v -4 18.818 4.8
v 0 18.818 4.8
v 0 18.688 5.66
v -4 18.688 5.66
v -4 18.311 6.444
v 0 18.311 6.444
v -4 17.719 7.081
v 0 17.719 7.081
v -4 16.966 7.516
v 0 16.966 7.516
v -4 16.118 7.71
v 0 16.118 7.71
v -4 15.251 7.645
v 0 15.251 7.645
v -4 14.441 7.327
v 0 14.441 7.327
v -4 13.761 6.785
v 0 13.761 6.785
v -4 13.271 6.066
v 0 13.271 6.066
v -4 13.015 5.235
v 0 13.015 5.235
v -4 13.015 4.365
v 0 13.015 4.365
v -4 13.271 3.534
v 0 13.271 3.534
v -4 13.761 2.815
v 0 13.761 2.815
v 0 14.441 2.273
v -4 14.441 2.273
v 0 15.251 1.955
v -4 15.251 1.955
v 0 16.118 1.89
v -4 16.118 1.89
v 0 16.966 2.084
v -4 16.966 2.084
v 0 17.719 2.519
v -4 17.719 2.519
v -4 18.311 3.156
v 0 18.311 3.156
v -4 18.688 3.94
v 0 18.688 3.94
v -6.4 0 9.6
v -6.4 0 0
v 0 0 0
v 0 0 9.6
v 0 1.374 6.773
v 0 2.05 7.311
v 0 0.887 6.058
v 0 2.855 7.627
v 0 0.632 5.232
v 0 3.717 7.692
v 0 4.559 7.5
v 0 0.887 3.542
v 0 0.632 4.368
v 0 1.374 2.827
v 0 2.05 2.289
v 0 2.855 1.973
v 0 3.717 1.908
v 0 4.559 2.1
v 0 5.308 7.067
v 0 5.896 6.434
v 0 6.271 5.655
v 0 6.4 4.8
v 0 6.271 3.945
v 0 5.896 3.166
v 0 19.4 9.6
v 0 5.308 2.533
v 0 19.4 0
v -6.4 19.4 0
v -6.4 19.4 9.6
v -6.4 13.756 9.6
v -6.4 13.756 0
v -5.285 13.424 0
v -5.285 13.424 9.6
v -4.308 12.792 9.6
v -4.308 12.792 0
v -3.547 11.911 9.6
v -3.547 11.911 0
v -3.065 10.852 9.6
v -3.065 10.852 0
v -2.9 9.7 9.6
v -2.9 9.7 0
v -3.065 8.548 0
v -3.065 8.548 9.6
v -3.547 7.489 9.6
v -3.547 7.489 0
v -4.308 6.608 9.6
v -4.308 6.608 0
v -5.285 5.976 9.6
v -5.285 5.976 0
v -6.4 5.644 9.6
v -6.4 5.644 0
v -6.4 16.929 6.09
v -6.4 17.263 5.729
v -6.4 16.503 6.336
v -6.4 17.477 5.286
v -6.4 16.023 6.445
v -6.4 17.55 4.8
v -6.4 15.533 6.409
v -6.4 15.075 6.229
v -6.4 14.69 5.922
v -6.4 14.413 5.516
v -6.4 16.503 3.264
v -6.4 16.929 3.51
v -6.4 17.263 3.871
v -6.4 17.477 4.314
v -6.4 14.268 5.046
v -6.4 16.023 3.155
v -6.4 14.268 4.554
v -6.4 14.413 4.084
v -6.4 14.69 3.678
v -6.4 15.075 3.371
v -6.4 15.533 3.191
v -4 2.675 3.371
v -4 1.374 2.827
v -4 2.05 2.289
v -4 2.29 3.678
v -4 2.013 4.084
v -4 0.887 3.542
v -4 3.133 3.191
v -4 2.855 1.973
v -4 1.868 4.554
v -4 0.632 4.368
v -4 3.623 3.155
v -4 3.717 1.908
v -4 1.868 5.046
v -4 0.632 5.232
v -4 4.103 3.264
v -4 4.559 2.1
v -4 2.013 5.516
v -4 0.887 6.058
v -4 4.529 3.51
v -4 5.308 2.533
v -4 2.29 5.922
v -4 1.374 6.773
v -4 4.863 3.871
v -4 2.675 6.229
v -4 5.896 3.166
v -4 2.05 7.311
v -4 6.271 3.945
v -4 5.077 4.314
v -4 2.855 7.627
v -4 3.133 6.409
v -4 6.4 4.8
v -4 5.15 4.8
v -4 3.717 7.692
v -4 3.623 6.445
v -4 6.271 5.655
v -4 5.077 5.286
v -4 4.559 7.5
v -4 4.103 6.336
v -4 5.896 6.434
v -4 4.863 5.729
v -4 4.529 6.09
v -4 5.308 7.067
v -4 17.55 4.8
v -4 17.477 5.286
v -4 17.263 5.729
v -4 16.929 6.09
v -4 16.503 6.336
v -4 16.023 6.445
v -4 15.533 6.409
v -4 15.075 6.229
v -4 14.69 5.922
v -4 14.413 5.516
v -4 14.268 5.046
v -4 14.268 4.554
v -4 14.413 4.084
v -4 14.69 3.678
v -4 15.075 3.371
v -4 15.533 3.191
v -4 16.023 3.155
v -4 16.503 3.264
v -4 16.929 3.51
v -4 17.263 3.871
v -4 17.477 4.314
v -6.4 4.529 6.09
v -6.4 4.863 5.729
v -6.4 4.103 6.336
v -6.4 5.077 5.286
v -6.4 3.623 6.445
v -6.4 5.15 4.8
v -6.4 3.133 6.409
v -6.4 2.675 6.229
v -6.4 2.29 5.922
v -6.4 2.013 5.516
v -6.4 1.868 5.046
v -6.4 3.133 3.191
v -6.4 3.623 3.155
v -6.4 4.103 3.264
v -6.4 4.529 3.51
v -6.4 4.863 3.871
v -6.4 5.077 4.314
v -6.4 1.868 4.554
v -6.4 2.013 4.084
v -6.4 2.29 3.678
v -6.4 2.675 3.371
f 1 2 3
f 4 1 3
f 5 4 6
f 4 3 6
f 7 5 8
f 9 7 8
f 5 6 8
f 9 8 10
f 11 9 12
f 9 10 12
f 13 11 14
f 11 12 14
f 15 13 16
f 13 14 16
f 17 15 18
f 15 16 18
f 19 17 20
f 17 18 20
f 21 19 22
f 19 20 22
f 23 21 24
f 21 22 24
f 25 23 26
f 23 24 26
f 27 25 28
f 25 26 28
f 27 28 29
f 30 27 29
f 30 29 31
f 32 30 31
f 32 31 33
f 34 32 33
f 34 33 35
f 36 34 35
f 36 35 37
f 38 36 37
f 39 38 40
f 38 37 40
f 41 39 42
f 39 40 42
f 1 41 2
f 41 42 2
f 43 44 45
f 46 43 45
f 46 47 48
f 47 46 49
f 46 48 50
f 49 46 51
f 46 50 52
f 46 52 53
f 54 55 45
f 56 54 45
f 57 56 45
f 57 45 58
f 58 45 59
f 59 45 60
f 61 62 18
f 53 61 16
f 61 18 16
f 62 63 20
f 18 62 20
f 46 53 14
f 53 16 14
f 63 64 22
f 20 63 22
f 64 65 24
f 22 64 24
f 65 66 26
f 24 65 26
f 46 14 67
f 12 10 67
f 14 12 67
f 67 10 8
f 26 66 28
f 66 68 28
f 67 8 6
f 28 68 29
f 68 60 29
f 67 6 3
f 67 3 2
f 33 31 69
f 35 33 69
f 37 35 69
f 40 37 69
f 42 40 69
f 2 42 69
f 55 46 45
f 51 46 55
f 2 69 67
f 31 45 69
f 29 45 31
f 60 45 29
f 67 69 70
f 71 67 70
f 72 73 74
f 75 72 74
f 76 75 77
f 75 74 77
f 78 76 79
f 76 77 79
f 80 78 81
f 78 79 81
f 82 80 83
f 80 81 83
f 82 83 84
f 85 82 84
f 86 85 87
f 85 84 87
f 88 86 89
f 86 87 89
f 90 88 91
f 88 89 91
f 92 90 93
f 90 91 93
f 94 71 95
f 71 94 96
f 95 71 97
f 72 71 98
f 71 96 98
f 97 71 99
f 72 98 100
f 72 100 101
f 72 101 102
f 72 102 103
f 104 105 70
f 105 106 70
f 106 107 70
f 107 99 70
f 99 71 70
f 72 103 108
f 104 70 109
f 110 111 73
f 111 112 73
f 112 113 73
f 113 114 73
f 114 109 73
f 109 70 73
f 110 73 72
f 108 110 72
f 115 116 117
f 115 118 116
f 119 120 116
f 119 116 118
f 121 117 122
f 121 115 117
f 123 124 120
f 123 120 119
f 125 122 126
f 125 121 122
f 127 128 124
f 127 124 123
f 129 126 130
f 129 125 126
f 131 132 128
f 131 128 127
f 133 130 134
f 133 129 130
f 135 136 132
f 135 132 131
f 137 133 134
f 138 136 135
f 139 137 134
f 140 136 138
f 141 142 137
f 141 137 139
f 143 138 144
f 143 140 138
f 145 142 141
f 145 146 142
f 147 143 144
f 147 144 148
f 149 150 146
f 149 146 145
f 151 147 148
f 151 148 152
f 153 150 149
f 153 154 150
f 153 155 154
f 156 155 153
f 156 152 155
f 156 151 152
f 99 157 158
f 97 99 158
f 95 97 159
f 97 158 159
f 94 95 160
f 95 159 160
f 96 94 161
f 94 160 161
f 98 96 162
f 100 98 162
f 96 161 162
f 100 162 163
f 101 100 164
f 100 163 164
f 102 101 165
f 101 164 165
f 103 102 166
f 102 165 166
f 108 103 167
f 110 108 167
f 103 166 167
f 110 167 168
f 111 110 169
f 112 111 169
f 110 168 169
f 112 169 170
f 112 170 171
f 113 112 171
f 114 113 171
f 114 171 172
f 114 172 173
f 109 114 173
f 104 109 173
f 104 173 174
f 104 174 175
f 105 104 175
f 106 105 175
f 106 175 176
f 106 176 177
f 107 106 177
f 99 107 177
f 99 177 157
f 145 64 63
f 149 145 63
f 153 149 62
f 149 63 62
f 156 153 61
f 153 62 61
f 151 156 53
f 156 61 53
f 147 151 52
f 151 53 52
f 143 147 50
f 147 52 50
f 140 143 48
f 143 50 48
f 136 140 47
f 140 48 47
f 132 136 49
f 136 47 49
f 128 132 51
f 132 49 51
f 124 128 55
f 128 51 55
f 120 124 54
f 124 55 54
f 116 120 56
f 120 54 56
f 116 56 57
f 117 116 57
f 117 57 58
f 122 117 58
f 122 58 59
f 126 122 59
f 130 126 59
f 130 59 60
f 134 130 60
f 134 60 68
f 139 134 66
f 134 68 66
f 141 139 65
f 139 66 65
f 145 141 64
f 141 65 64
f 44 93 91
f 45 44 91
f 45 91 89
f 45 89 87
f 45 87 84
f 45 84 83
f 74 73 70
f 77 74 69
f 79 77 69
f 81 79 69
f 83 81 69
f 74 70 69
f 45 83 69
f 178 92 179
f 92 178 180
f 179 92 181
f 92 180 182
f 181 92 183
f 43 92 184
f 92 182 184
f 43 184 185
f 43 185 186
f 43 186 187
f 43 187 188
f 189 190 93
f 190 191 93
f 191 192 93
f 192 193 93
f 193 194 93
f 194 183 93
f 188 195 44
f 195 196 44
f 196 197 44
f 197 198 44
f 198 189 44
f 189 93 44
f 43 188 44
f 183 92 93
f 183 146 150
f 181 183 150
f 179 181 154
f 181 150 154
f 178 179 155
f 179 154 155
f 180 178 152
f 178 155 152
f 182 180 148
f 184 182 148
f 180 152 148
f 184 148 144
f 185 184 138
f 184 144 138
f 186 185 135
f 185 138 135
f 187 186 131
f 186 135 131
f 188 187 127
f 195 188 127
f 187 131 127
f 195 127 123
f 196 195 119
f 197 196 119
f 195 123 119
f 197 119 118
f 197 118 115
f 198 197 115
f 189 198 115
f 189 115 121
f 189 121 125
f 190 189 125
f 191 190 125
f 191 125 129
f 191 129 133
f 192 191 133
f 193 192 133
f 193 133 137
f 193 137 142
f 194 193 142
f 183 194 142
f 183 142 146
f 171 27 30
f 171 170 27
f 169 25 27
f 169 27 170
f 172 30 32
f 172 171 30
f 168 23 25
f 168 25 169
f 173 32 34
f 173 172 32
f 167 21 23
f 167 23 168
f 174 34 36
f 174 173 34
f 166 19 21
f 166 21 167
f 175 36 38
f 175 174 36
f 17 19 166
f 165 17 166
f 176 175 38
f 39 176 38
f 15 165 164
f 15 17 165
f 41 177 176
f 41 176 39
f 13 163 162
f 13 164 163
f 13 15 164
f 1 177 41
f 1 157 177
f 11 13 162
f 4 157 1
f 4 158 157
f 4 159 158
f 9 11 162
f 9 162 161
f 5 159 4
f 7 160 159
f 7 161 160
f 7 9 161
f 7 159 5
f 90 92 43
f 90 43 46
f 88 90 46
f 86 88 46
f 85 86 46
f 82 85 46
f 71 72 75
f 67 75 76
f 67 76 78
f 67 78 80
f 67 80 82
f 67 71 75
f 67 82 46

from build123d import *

# Parameters (mm, degrees)
F1_DEPTH = 9.6
F2_R     = 1.65
F3_DEPTH = 25
F2_R_2   = 2.9
F2_R_3   = 2.917698
F4_DEPTH = 4


with BuildPart() as f1:
    # F0 (on Top) → F1 (new body)
    with BuildSketch(Plane.XY):
        with BuildLine():
            ThreePointArc((-6.4, 13.75586), (-3.89597, 12.378619), (-2.9, 9.7))
            ThreePointArc((-2.9, 9.7), (-3.89597, 7.021381), (-6.4, 5.64414))
            Line((-6.4, 5.64414), (-6.4, 0))
            Line((-6.4, 0), (0, 0))
            Line((0, 0), (0, 19.4))
            Line((0, 19.4), (-6.4, 19.4))
            Line((-6.4, 19.4), (-6.4, 13.75586))
        make_face()
    extrude(amount=F1_DEPTH)

    # F2 (on Right) → F3 (cut)
    with BuildSketch(Plane.YZ):
        with Locations((3.5, 4.8)):
            Circle(F2_R)
        with Locations((15.9, 4.8)):
            Circle(F2_R)
    extrude(amount=-F3_DEPTH, mode=Mode.SUBTRACT)

    # F2 (on Right) → F4 (cut)
    with BuildSketch(Plane.YZ):
        with Locations((3.5, 4.8)):
            Circle(F2_R_2)
        with Locations((3.5, 4.8)):
            Circle(F2_R, mode=Mode.SUBTRACT)
        with Locations((15.9, 4.8)):
            Circle(F2_R_3)
        with Locations((15.9, 4.8)):
            Circle(F2_R, mode=Mode.SUBTRACT)
    extrude(amount=-F4_DEPTH, mode=Mode.SUBTRACT)


solid = f1.part
